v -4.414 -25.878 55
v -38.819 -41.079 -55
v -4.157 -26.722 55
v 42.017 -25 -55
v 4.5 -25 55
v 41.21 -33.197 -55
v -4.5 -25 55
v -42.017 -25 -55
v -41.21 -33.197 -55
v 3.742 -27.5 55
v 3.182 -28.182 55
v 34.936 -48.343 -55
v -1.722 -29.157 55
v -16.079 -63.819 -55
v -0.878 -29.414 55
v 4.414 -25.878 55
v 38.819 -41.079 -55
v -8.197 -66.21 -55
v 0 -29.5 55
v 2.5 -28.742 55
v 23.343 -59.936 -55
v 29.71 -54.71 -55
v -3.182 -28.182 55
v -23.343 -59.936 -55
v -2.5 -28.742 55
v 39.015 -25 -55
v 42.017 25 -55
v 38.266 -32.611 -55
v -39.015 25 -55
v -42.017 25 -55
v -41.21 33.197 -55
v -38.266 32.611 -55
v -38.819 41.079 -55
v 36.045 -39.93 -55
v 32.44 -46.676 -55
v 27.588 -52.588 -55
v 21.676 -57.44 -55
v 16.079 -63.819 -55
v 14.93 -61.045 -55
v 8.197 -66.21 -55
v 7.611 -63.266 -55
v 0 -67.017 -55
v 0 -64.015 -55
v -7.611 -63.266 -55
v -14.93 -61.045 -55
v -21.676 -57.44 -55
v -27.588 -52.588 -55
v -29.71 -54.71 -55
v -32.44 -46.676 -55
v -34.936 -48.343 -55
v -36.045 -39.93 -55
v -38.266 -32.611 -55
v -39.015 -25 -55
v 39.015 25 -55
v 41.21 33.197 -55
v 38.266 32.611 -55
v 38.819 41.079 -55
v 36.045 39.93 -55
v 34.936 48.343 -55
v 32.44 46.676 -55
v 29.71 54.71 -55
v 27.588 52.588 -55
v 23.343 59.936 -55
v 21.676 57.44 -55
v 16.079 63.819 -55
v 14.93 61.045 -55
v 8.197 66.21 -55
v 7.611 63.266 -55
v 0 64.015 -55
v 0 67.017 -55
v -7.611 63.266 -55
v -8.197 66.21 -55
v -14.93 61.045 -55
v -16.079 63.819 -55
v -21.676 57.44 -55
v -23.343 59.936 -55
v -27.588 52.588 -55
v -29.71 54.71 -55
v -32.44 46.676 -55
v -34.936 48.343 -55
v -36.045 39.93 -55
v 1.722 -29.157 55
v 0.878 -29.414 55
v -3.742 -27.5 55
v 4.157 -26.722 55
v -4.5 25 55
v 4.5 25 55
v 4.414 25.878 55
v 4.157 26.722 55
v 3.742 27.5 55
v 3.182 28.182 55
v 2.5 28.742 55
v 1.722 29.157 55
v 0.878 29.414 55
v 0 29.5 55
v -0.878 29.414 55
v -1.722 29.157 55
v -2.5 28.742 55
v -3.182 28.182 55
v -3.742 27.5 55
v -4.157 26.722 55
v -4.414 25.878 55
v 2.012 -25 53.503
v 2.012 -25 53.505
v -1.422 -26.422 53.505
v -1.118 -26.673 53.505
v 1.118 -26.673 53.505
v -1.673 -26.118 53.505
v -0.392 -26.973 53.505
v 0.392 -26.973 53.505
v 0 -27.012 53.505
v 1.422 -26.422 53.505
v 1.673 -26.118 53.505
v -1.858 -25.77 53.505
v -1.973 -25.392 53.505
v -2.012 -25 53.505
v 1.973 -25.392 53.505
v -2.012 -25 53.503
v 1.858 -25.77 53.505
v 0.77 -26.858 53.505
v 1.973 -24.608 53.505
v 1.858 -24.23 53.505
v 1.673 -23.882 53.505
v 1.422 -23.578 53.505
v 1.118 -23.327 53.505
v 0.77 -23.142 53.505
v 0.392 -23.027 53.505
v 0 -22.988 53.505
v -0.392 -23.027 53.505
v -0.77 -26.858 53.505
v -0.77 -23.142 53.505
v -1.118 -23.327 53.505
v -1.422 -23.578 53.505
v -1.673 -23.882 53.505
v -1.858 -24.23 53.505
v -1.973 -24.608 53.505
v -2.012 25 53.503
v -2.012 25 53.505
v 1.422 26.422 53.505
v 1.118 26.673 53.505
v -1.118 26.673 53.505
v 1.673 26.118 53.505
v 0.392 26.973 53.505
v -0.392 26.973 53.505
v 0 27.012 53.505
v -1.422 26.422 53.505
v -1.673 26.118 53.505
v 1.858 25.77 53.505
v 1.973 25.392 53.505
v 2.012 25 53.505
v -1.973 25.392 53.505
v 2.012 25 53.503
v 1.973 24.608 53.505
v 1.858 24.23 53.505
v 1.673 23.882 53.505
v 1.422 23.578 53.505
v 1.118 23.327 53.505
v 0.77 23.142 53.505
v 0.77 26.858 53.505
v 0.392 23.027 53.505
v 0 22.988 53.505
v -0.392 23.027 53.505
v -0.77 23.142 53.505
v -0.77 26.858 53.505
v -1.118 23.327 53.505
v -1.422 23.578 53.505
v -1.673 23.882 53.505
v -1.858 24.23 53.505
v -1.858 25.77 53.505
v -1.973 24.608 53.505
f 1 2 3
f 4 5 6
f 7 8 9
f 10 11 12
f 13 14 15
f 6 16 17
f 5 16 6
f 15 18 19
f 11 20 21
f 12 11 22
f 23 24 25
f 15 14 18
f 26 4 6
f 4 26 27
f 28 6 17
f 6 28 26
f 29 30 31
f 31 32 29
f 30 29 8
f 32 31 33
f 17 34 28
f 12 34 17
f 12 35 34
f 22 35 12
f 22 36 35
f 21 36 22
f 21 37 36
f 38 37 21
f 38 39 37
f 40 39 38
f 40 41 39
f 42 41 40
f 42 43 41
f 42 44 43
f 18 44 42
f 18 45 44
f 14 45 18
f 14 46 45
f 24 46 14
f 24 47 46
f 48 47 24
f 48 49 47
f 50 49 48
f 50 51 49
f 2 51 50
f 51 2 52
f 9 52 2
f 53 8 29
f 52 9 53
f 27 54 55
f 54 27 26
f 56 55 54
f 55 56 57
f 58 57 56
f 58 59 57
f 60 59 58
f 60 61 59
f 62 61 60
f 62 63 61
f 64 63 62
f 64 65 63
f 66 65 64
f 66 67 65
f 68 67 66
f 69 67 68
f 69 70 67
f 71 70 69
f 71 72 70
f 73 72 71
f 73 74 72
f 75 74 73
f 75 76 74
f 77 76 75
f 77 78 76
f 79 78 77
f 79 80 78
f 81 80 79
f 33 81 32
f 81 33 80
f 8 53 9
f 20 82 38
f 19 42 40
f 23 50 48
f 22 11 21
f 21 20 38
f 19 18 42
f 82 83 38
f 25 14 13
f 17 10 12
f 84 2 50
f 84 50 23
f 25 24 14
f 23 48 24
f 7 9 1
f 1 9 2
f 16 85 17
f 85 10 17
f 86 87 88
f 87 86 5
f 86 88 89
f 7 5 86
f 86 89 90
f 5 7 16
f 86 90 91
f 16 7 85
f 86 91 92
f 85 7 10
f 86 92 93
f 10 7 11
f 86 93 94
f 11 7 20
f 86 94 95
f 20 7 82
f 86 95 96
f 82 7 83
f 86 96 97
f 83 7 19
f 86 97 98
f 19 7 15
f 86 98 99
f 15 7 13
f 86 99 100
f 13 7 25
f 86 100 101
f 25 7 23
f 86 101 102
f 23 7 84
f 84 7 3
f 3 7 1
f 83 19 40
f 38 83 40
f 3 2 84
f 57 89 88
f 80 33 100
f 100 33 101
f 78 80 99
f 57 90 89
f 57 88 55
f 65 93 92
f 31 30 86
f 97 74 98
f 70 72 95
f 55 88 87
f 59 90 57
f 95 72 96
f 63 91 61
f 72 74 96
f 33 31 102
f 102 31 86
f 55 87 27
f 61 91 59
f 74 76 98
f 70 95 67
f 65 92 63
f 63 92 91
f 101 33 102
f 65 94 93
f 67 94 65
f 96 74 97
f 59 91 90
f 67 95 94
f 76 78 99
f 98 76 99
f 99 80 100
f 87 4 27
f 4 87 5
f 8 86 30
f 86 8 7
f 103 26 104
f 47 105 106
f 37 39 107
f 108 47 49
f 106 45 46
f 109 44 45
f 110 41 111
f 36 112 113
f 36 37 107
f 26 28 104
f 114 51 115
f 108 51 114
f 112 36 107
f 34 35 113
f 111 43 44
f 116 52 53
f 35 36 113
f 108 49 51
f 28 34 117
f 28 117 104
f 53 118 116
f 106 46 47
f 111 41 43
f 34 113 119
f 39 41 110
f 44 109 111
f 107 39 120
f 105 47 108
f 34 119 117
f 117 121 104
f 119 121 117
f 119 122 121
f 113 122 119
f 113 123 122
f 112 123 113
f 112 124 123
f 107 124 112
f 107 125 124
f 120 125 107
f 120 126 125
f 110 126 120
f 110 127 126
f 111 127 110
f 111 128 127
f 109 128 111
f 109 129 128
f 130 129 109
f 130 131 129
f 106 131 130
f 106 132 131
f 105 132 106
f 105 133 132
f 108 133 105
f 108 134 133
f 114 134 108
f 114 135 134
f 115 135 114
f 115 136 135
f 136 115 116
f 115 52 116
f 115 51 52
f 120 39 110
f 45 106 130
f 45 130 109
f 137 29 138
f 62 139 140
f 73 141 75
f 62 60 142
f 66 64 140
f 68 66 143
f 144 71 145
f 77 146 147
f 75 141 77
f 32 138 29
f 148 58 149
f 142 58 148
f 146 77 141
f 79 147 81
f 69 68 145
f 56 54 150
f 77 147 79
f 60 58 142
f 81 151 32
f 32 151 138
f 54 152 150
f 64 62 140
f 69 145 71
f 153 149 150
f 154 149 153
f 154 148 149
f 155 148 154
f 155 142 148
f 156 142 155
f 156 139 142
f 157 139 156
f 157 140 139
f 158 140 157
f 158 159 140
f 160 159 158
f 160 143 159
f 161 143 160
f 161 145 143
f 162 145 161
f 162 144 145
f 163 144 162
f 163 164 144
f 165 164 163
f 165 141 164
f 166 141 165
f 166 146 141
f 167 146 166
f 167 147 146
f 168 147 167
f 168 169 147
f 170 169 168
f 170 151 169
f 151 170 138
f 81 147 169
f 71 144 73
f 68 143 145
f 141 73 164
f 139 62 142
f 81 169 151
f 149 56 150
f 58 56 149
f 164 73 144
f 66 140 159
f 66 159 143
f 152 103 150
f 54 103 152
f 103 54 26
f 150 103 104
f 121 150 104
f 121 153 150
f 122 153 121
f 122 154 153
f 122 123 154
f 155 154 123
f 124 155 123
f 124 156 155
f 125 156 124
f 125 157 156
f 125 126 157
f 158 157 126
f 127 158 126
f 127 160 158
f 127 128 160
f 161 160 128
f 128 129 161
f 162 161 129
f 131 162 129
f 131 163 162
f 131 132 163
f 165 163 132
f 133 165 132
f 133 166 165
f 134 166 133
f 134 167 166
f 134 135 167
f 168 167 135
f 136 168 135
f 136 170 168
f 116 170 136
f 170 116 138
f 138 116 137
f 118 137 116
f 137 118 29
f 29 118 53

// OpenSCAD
// Start: lazy_union
default_5_default_5();
// End: lazy_union

// Modules.

// 'PartMaterial undef-default - default 5.0'
module default_5_default_5() {
  // 'None : _combine_solids_and_holes'
  union() {
    // '_combine_solids_and_holes'
    difference() {
      // 'default : _combine_solids_and_holes'
      union() {
        // 'outer : _combine_solids_and_holes'
        union() {
          // 'cone1'
          multmatrix(m=[[1.0, 0.0, 0.0, 0.0], [0.0, 1.0, 0.0, -25.0], [0.0, 0.0, 1.0, -55.0], [0.0, 0.0, 0.0, 1.0]]) {
            // 'cone1 : _combine_solids_and_holes'
            union() {
              // 'cone1'
              cylinder(h=110.0, r1=42.01690497626037, r2=4.5, center=false, $fn=32);
            }
          }
          // 'cone2'
          multmatrix(m=[[-1.0, 0.0, 0.0, 0.0], [0.0, -1.0, 0.0, 25.0], [0.0, 0.0, 1.0, -55.0], [0.0, 0.0, 0.0, 1.0]]) {
            // 'cone2 : _combine_solids_and_holes'
            union() {
              // 'cone2'
              cylinder(h=110.0, r1=42.01690497626037, r2=4.5, center=false, $fn=32);
            }
          }
          // 'prism'
          multmatrix(m=[[-1.0, 0.0, 0.0, 0.0], [0.0, 0.0, 1.0, -25.0], [0.0, 1.0, 0.0, -55.0], [0.0, 0.0, 0.0, 1.0]]) {
            // 'prism : _combine_solids_and_holes'
            union() {
              // 'prism'
              linear_extrude(height=50.0, twist=0.0, slices=4, scale=[1.0, 1.0], $fn=32) {
                polygon(points=[[0.0, 0.0], [-42.01690497626037, 0.0], [-4.5, 110.0], [4.5, 110.0], [42.01690497626037, 0.0]]);
              }
            }
          }
        }
      }
      // 'default'
      multmatrix(m=[[1.0, 0.0, 0.0, 0.0], [0.0, 1.0, 0.0, 0.0], [0.0, 0.0, 1.0, -0.75], [0.0, 0.0, 0.0, 1.0]]) {
        // 'inner : _combine_solids_and_holes'
        union() {
          // 'cone1'
          multmatrix(m=[[1.0, 0.0, 0.0, 0.0], [0.0, 1.0, 0.0, -25.0], [0.0, 0.0, 1.0, -54.255], [0.0, 0.0, 0.0, 1.0]]) {
            // 'cone1 : _combine_solids_and_holes'
            union() {
              // 'cone1'
              cylinder(h=108.51, r1=39.01690497626037, r2=2.0115941587671866, center=false, $fn=32);
            }
          }
          // 'cone2'
          multmatrix(m=[[-1.0, 0.0, 0.0, 0.0], [0.0, -1.0, 0.0, 25.0], [0.0, 0.0, 1.0, -54.255], [0.0, 0.0, 0.0, 1.0]]) {
            // 'cone2 : _combine_solids_and_holes'
            union() {
              // 'cone2'
              cylinder(h=108.51, r1=39.01690497626037, r2=2.0115941587671866, center=false, $fn=32);
            }
          }
          // 'prism'
          multmatrix(m=[[-1.0, 0.0, 0.0, 0.0], [0.0, 0.0, 1.0, -25.0], [0.0, 1.0, 0.0, -54.255], [0.0, 0.0, 0.0, 1.0]]) {
            // 'prism : _combine_solids_and_holes'
            union() {
              // 'prism'
              linear_extrude(height=50.0, twist=0.0, slices=4, scale=[1.0, 1.0], $fn=32) {
                polygon(points=[[0.0, 0.0], [-39.01690497626037, 0.0], [-2.0115941587671866, 108.51], [2.0115941587671866, 108.51], [39.01690497626037, 0.0]]);
              }
            }
          }
        }
      }
    }
  }
} // end module default_5_default_5
